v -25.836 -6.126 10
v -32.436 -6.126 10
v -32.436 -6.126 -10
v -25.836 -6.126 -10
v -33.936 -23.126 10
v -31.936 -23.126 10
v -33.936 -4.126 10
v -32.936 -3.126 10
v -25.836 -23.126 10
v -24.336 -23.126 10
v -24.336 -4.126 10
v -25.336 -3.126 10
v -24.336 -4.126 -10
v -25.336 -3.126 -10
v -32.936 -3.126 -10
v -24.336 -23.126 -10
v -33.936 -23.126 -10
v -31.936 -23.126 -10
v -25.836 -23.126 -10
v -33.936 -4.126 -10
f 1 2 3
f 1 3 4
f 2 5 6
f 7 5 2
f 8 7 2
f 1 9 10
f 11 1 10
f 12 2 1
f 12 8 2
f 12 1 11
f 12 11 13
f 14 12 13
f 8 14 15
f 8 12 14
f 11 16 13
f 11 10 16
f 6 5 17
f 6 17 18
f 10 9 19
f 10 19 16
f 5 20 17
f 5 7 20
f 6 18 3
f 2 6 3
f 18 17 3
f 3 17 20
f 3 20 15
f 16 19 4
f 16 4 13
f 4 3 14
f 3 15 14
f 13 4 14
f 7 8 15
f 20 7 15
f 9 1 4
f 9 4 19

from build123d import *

# Parameters (mm, degrees)
F1_DEPTH = 10
F2_SIZE  = 1


with BuildPart() as f1:
    # F0 (on Top) → F1 (new body, symmetric)
    with BuildSketch(Plane.XY):
        Polygon((-33.935995, -3.126303), (-33.935995, -23.126303), (-31.935995, -23.126303), (-32.435995, -6.126303), (-25.835995, -6.126303), (-25.835995, -23.126303), (-24.335995, -23.126303), (-24.335995, -3.126303), align=None)
    extrude(amount=F1_DEPTH, both=True)

    # F2
    f2_edges = [f1.edges().sort_by_distance(p)[0] for p in [
        (-33.935995, -3.126303, 0),
        (-24.335995, -3.126303, 0),
    ]]
    chamfer(f2_edges, length=F2_SIZE)


solid = f1.part
